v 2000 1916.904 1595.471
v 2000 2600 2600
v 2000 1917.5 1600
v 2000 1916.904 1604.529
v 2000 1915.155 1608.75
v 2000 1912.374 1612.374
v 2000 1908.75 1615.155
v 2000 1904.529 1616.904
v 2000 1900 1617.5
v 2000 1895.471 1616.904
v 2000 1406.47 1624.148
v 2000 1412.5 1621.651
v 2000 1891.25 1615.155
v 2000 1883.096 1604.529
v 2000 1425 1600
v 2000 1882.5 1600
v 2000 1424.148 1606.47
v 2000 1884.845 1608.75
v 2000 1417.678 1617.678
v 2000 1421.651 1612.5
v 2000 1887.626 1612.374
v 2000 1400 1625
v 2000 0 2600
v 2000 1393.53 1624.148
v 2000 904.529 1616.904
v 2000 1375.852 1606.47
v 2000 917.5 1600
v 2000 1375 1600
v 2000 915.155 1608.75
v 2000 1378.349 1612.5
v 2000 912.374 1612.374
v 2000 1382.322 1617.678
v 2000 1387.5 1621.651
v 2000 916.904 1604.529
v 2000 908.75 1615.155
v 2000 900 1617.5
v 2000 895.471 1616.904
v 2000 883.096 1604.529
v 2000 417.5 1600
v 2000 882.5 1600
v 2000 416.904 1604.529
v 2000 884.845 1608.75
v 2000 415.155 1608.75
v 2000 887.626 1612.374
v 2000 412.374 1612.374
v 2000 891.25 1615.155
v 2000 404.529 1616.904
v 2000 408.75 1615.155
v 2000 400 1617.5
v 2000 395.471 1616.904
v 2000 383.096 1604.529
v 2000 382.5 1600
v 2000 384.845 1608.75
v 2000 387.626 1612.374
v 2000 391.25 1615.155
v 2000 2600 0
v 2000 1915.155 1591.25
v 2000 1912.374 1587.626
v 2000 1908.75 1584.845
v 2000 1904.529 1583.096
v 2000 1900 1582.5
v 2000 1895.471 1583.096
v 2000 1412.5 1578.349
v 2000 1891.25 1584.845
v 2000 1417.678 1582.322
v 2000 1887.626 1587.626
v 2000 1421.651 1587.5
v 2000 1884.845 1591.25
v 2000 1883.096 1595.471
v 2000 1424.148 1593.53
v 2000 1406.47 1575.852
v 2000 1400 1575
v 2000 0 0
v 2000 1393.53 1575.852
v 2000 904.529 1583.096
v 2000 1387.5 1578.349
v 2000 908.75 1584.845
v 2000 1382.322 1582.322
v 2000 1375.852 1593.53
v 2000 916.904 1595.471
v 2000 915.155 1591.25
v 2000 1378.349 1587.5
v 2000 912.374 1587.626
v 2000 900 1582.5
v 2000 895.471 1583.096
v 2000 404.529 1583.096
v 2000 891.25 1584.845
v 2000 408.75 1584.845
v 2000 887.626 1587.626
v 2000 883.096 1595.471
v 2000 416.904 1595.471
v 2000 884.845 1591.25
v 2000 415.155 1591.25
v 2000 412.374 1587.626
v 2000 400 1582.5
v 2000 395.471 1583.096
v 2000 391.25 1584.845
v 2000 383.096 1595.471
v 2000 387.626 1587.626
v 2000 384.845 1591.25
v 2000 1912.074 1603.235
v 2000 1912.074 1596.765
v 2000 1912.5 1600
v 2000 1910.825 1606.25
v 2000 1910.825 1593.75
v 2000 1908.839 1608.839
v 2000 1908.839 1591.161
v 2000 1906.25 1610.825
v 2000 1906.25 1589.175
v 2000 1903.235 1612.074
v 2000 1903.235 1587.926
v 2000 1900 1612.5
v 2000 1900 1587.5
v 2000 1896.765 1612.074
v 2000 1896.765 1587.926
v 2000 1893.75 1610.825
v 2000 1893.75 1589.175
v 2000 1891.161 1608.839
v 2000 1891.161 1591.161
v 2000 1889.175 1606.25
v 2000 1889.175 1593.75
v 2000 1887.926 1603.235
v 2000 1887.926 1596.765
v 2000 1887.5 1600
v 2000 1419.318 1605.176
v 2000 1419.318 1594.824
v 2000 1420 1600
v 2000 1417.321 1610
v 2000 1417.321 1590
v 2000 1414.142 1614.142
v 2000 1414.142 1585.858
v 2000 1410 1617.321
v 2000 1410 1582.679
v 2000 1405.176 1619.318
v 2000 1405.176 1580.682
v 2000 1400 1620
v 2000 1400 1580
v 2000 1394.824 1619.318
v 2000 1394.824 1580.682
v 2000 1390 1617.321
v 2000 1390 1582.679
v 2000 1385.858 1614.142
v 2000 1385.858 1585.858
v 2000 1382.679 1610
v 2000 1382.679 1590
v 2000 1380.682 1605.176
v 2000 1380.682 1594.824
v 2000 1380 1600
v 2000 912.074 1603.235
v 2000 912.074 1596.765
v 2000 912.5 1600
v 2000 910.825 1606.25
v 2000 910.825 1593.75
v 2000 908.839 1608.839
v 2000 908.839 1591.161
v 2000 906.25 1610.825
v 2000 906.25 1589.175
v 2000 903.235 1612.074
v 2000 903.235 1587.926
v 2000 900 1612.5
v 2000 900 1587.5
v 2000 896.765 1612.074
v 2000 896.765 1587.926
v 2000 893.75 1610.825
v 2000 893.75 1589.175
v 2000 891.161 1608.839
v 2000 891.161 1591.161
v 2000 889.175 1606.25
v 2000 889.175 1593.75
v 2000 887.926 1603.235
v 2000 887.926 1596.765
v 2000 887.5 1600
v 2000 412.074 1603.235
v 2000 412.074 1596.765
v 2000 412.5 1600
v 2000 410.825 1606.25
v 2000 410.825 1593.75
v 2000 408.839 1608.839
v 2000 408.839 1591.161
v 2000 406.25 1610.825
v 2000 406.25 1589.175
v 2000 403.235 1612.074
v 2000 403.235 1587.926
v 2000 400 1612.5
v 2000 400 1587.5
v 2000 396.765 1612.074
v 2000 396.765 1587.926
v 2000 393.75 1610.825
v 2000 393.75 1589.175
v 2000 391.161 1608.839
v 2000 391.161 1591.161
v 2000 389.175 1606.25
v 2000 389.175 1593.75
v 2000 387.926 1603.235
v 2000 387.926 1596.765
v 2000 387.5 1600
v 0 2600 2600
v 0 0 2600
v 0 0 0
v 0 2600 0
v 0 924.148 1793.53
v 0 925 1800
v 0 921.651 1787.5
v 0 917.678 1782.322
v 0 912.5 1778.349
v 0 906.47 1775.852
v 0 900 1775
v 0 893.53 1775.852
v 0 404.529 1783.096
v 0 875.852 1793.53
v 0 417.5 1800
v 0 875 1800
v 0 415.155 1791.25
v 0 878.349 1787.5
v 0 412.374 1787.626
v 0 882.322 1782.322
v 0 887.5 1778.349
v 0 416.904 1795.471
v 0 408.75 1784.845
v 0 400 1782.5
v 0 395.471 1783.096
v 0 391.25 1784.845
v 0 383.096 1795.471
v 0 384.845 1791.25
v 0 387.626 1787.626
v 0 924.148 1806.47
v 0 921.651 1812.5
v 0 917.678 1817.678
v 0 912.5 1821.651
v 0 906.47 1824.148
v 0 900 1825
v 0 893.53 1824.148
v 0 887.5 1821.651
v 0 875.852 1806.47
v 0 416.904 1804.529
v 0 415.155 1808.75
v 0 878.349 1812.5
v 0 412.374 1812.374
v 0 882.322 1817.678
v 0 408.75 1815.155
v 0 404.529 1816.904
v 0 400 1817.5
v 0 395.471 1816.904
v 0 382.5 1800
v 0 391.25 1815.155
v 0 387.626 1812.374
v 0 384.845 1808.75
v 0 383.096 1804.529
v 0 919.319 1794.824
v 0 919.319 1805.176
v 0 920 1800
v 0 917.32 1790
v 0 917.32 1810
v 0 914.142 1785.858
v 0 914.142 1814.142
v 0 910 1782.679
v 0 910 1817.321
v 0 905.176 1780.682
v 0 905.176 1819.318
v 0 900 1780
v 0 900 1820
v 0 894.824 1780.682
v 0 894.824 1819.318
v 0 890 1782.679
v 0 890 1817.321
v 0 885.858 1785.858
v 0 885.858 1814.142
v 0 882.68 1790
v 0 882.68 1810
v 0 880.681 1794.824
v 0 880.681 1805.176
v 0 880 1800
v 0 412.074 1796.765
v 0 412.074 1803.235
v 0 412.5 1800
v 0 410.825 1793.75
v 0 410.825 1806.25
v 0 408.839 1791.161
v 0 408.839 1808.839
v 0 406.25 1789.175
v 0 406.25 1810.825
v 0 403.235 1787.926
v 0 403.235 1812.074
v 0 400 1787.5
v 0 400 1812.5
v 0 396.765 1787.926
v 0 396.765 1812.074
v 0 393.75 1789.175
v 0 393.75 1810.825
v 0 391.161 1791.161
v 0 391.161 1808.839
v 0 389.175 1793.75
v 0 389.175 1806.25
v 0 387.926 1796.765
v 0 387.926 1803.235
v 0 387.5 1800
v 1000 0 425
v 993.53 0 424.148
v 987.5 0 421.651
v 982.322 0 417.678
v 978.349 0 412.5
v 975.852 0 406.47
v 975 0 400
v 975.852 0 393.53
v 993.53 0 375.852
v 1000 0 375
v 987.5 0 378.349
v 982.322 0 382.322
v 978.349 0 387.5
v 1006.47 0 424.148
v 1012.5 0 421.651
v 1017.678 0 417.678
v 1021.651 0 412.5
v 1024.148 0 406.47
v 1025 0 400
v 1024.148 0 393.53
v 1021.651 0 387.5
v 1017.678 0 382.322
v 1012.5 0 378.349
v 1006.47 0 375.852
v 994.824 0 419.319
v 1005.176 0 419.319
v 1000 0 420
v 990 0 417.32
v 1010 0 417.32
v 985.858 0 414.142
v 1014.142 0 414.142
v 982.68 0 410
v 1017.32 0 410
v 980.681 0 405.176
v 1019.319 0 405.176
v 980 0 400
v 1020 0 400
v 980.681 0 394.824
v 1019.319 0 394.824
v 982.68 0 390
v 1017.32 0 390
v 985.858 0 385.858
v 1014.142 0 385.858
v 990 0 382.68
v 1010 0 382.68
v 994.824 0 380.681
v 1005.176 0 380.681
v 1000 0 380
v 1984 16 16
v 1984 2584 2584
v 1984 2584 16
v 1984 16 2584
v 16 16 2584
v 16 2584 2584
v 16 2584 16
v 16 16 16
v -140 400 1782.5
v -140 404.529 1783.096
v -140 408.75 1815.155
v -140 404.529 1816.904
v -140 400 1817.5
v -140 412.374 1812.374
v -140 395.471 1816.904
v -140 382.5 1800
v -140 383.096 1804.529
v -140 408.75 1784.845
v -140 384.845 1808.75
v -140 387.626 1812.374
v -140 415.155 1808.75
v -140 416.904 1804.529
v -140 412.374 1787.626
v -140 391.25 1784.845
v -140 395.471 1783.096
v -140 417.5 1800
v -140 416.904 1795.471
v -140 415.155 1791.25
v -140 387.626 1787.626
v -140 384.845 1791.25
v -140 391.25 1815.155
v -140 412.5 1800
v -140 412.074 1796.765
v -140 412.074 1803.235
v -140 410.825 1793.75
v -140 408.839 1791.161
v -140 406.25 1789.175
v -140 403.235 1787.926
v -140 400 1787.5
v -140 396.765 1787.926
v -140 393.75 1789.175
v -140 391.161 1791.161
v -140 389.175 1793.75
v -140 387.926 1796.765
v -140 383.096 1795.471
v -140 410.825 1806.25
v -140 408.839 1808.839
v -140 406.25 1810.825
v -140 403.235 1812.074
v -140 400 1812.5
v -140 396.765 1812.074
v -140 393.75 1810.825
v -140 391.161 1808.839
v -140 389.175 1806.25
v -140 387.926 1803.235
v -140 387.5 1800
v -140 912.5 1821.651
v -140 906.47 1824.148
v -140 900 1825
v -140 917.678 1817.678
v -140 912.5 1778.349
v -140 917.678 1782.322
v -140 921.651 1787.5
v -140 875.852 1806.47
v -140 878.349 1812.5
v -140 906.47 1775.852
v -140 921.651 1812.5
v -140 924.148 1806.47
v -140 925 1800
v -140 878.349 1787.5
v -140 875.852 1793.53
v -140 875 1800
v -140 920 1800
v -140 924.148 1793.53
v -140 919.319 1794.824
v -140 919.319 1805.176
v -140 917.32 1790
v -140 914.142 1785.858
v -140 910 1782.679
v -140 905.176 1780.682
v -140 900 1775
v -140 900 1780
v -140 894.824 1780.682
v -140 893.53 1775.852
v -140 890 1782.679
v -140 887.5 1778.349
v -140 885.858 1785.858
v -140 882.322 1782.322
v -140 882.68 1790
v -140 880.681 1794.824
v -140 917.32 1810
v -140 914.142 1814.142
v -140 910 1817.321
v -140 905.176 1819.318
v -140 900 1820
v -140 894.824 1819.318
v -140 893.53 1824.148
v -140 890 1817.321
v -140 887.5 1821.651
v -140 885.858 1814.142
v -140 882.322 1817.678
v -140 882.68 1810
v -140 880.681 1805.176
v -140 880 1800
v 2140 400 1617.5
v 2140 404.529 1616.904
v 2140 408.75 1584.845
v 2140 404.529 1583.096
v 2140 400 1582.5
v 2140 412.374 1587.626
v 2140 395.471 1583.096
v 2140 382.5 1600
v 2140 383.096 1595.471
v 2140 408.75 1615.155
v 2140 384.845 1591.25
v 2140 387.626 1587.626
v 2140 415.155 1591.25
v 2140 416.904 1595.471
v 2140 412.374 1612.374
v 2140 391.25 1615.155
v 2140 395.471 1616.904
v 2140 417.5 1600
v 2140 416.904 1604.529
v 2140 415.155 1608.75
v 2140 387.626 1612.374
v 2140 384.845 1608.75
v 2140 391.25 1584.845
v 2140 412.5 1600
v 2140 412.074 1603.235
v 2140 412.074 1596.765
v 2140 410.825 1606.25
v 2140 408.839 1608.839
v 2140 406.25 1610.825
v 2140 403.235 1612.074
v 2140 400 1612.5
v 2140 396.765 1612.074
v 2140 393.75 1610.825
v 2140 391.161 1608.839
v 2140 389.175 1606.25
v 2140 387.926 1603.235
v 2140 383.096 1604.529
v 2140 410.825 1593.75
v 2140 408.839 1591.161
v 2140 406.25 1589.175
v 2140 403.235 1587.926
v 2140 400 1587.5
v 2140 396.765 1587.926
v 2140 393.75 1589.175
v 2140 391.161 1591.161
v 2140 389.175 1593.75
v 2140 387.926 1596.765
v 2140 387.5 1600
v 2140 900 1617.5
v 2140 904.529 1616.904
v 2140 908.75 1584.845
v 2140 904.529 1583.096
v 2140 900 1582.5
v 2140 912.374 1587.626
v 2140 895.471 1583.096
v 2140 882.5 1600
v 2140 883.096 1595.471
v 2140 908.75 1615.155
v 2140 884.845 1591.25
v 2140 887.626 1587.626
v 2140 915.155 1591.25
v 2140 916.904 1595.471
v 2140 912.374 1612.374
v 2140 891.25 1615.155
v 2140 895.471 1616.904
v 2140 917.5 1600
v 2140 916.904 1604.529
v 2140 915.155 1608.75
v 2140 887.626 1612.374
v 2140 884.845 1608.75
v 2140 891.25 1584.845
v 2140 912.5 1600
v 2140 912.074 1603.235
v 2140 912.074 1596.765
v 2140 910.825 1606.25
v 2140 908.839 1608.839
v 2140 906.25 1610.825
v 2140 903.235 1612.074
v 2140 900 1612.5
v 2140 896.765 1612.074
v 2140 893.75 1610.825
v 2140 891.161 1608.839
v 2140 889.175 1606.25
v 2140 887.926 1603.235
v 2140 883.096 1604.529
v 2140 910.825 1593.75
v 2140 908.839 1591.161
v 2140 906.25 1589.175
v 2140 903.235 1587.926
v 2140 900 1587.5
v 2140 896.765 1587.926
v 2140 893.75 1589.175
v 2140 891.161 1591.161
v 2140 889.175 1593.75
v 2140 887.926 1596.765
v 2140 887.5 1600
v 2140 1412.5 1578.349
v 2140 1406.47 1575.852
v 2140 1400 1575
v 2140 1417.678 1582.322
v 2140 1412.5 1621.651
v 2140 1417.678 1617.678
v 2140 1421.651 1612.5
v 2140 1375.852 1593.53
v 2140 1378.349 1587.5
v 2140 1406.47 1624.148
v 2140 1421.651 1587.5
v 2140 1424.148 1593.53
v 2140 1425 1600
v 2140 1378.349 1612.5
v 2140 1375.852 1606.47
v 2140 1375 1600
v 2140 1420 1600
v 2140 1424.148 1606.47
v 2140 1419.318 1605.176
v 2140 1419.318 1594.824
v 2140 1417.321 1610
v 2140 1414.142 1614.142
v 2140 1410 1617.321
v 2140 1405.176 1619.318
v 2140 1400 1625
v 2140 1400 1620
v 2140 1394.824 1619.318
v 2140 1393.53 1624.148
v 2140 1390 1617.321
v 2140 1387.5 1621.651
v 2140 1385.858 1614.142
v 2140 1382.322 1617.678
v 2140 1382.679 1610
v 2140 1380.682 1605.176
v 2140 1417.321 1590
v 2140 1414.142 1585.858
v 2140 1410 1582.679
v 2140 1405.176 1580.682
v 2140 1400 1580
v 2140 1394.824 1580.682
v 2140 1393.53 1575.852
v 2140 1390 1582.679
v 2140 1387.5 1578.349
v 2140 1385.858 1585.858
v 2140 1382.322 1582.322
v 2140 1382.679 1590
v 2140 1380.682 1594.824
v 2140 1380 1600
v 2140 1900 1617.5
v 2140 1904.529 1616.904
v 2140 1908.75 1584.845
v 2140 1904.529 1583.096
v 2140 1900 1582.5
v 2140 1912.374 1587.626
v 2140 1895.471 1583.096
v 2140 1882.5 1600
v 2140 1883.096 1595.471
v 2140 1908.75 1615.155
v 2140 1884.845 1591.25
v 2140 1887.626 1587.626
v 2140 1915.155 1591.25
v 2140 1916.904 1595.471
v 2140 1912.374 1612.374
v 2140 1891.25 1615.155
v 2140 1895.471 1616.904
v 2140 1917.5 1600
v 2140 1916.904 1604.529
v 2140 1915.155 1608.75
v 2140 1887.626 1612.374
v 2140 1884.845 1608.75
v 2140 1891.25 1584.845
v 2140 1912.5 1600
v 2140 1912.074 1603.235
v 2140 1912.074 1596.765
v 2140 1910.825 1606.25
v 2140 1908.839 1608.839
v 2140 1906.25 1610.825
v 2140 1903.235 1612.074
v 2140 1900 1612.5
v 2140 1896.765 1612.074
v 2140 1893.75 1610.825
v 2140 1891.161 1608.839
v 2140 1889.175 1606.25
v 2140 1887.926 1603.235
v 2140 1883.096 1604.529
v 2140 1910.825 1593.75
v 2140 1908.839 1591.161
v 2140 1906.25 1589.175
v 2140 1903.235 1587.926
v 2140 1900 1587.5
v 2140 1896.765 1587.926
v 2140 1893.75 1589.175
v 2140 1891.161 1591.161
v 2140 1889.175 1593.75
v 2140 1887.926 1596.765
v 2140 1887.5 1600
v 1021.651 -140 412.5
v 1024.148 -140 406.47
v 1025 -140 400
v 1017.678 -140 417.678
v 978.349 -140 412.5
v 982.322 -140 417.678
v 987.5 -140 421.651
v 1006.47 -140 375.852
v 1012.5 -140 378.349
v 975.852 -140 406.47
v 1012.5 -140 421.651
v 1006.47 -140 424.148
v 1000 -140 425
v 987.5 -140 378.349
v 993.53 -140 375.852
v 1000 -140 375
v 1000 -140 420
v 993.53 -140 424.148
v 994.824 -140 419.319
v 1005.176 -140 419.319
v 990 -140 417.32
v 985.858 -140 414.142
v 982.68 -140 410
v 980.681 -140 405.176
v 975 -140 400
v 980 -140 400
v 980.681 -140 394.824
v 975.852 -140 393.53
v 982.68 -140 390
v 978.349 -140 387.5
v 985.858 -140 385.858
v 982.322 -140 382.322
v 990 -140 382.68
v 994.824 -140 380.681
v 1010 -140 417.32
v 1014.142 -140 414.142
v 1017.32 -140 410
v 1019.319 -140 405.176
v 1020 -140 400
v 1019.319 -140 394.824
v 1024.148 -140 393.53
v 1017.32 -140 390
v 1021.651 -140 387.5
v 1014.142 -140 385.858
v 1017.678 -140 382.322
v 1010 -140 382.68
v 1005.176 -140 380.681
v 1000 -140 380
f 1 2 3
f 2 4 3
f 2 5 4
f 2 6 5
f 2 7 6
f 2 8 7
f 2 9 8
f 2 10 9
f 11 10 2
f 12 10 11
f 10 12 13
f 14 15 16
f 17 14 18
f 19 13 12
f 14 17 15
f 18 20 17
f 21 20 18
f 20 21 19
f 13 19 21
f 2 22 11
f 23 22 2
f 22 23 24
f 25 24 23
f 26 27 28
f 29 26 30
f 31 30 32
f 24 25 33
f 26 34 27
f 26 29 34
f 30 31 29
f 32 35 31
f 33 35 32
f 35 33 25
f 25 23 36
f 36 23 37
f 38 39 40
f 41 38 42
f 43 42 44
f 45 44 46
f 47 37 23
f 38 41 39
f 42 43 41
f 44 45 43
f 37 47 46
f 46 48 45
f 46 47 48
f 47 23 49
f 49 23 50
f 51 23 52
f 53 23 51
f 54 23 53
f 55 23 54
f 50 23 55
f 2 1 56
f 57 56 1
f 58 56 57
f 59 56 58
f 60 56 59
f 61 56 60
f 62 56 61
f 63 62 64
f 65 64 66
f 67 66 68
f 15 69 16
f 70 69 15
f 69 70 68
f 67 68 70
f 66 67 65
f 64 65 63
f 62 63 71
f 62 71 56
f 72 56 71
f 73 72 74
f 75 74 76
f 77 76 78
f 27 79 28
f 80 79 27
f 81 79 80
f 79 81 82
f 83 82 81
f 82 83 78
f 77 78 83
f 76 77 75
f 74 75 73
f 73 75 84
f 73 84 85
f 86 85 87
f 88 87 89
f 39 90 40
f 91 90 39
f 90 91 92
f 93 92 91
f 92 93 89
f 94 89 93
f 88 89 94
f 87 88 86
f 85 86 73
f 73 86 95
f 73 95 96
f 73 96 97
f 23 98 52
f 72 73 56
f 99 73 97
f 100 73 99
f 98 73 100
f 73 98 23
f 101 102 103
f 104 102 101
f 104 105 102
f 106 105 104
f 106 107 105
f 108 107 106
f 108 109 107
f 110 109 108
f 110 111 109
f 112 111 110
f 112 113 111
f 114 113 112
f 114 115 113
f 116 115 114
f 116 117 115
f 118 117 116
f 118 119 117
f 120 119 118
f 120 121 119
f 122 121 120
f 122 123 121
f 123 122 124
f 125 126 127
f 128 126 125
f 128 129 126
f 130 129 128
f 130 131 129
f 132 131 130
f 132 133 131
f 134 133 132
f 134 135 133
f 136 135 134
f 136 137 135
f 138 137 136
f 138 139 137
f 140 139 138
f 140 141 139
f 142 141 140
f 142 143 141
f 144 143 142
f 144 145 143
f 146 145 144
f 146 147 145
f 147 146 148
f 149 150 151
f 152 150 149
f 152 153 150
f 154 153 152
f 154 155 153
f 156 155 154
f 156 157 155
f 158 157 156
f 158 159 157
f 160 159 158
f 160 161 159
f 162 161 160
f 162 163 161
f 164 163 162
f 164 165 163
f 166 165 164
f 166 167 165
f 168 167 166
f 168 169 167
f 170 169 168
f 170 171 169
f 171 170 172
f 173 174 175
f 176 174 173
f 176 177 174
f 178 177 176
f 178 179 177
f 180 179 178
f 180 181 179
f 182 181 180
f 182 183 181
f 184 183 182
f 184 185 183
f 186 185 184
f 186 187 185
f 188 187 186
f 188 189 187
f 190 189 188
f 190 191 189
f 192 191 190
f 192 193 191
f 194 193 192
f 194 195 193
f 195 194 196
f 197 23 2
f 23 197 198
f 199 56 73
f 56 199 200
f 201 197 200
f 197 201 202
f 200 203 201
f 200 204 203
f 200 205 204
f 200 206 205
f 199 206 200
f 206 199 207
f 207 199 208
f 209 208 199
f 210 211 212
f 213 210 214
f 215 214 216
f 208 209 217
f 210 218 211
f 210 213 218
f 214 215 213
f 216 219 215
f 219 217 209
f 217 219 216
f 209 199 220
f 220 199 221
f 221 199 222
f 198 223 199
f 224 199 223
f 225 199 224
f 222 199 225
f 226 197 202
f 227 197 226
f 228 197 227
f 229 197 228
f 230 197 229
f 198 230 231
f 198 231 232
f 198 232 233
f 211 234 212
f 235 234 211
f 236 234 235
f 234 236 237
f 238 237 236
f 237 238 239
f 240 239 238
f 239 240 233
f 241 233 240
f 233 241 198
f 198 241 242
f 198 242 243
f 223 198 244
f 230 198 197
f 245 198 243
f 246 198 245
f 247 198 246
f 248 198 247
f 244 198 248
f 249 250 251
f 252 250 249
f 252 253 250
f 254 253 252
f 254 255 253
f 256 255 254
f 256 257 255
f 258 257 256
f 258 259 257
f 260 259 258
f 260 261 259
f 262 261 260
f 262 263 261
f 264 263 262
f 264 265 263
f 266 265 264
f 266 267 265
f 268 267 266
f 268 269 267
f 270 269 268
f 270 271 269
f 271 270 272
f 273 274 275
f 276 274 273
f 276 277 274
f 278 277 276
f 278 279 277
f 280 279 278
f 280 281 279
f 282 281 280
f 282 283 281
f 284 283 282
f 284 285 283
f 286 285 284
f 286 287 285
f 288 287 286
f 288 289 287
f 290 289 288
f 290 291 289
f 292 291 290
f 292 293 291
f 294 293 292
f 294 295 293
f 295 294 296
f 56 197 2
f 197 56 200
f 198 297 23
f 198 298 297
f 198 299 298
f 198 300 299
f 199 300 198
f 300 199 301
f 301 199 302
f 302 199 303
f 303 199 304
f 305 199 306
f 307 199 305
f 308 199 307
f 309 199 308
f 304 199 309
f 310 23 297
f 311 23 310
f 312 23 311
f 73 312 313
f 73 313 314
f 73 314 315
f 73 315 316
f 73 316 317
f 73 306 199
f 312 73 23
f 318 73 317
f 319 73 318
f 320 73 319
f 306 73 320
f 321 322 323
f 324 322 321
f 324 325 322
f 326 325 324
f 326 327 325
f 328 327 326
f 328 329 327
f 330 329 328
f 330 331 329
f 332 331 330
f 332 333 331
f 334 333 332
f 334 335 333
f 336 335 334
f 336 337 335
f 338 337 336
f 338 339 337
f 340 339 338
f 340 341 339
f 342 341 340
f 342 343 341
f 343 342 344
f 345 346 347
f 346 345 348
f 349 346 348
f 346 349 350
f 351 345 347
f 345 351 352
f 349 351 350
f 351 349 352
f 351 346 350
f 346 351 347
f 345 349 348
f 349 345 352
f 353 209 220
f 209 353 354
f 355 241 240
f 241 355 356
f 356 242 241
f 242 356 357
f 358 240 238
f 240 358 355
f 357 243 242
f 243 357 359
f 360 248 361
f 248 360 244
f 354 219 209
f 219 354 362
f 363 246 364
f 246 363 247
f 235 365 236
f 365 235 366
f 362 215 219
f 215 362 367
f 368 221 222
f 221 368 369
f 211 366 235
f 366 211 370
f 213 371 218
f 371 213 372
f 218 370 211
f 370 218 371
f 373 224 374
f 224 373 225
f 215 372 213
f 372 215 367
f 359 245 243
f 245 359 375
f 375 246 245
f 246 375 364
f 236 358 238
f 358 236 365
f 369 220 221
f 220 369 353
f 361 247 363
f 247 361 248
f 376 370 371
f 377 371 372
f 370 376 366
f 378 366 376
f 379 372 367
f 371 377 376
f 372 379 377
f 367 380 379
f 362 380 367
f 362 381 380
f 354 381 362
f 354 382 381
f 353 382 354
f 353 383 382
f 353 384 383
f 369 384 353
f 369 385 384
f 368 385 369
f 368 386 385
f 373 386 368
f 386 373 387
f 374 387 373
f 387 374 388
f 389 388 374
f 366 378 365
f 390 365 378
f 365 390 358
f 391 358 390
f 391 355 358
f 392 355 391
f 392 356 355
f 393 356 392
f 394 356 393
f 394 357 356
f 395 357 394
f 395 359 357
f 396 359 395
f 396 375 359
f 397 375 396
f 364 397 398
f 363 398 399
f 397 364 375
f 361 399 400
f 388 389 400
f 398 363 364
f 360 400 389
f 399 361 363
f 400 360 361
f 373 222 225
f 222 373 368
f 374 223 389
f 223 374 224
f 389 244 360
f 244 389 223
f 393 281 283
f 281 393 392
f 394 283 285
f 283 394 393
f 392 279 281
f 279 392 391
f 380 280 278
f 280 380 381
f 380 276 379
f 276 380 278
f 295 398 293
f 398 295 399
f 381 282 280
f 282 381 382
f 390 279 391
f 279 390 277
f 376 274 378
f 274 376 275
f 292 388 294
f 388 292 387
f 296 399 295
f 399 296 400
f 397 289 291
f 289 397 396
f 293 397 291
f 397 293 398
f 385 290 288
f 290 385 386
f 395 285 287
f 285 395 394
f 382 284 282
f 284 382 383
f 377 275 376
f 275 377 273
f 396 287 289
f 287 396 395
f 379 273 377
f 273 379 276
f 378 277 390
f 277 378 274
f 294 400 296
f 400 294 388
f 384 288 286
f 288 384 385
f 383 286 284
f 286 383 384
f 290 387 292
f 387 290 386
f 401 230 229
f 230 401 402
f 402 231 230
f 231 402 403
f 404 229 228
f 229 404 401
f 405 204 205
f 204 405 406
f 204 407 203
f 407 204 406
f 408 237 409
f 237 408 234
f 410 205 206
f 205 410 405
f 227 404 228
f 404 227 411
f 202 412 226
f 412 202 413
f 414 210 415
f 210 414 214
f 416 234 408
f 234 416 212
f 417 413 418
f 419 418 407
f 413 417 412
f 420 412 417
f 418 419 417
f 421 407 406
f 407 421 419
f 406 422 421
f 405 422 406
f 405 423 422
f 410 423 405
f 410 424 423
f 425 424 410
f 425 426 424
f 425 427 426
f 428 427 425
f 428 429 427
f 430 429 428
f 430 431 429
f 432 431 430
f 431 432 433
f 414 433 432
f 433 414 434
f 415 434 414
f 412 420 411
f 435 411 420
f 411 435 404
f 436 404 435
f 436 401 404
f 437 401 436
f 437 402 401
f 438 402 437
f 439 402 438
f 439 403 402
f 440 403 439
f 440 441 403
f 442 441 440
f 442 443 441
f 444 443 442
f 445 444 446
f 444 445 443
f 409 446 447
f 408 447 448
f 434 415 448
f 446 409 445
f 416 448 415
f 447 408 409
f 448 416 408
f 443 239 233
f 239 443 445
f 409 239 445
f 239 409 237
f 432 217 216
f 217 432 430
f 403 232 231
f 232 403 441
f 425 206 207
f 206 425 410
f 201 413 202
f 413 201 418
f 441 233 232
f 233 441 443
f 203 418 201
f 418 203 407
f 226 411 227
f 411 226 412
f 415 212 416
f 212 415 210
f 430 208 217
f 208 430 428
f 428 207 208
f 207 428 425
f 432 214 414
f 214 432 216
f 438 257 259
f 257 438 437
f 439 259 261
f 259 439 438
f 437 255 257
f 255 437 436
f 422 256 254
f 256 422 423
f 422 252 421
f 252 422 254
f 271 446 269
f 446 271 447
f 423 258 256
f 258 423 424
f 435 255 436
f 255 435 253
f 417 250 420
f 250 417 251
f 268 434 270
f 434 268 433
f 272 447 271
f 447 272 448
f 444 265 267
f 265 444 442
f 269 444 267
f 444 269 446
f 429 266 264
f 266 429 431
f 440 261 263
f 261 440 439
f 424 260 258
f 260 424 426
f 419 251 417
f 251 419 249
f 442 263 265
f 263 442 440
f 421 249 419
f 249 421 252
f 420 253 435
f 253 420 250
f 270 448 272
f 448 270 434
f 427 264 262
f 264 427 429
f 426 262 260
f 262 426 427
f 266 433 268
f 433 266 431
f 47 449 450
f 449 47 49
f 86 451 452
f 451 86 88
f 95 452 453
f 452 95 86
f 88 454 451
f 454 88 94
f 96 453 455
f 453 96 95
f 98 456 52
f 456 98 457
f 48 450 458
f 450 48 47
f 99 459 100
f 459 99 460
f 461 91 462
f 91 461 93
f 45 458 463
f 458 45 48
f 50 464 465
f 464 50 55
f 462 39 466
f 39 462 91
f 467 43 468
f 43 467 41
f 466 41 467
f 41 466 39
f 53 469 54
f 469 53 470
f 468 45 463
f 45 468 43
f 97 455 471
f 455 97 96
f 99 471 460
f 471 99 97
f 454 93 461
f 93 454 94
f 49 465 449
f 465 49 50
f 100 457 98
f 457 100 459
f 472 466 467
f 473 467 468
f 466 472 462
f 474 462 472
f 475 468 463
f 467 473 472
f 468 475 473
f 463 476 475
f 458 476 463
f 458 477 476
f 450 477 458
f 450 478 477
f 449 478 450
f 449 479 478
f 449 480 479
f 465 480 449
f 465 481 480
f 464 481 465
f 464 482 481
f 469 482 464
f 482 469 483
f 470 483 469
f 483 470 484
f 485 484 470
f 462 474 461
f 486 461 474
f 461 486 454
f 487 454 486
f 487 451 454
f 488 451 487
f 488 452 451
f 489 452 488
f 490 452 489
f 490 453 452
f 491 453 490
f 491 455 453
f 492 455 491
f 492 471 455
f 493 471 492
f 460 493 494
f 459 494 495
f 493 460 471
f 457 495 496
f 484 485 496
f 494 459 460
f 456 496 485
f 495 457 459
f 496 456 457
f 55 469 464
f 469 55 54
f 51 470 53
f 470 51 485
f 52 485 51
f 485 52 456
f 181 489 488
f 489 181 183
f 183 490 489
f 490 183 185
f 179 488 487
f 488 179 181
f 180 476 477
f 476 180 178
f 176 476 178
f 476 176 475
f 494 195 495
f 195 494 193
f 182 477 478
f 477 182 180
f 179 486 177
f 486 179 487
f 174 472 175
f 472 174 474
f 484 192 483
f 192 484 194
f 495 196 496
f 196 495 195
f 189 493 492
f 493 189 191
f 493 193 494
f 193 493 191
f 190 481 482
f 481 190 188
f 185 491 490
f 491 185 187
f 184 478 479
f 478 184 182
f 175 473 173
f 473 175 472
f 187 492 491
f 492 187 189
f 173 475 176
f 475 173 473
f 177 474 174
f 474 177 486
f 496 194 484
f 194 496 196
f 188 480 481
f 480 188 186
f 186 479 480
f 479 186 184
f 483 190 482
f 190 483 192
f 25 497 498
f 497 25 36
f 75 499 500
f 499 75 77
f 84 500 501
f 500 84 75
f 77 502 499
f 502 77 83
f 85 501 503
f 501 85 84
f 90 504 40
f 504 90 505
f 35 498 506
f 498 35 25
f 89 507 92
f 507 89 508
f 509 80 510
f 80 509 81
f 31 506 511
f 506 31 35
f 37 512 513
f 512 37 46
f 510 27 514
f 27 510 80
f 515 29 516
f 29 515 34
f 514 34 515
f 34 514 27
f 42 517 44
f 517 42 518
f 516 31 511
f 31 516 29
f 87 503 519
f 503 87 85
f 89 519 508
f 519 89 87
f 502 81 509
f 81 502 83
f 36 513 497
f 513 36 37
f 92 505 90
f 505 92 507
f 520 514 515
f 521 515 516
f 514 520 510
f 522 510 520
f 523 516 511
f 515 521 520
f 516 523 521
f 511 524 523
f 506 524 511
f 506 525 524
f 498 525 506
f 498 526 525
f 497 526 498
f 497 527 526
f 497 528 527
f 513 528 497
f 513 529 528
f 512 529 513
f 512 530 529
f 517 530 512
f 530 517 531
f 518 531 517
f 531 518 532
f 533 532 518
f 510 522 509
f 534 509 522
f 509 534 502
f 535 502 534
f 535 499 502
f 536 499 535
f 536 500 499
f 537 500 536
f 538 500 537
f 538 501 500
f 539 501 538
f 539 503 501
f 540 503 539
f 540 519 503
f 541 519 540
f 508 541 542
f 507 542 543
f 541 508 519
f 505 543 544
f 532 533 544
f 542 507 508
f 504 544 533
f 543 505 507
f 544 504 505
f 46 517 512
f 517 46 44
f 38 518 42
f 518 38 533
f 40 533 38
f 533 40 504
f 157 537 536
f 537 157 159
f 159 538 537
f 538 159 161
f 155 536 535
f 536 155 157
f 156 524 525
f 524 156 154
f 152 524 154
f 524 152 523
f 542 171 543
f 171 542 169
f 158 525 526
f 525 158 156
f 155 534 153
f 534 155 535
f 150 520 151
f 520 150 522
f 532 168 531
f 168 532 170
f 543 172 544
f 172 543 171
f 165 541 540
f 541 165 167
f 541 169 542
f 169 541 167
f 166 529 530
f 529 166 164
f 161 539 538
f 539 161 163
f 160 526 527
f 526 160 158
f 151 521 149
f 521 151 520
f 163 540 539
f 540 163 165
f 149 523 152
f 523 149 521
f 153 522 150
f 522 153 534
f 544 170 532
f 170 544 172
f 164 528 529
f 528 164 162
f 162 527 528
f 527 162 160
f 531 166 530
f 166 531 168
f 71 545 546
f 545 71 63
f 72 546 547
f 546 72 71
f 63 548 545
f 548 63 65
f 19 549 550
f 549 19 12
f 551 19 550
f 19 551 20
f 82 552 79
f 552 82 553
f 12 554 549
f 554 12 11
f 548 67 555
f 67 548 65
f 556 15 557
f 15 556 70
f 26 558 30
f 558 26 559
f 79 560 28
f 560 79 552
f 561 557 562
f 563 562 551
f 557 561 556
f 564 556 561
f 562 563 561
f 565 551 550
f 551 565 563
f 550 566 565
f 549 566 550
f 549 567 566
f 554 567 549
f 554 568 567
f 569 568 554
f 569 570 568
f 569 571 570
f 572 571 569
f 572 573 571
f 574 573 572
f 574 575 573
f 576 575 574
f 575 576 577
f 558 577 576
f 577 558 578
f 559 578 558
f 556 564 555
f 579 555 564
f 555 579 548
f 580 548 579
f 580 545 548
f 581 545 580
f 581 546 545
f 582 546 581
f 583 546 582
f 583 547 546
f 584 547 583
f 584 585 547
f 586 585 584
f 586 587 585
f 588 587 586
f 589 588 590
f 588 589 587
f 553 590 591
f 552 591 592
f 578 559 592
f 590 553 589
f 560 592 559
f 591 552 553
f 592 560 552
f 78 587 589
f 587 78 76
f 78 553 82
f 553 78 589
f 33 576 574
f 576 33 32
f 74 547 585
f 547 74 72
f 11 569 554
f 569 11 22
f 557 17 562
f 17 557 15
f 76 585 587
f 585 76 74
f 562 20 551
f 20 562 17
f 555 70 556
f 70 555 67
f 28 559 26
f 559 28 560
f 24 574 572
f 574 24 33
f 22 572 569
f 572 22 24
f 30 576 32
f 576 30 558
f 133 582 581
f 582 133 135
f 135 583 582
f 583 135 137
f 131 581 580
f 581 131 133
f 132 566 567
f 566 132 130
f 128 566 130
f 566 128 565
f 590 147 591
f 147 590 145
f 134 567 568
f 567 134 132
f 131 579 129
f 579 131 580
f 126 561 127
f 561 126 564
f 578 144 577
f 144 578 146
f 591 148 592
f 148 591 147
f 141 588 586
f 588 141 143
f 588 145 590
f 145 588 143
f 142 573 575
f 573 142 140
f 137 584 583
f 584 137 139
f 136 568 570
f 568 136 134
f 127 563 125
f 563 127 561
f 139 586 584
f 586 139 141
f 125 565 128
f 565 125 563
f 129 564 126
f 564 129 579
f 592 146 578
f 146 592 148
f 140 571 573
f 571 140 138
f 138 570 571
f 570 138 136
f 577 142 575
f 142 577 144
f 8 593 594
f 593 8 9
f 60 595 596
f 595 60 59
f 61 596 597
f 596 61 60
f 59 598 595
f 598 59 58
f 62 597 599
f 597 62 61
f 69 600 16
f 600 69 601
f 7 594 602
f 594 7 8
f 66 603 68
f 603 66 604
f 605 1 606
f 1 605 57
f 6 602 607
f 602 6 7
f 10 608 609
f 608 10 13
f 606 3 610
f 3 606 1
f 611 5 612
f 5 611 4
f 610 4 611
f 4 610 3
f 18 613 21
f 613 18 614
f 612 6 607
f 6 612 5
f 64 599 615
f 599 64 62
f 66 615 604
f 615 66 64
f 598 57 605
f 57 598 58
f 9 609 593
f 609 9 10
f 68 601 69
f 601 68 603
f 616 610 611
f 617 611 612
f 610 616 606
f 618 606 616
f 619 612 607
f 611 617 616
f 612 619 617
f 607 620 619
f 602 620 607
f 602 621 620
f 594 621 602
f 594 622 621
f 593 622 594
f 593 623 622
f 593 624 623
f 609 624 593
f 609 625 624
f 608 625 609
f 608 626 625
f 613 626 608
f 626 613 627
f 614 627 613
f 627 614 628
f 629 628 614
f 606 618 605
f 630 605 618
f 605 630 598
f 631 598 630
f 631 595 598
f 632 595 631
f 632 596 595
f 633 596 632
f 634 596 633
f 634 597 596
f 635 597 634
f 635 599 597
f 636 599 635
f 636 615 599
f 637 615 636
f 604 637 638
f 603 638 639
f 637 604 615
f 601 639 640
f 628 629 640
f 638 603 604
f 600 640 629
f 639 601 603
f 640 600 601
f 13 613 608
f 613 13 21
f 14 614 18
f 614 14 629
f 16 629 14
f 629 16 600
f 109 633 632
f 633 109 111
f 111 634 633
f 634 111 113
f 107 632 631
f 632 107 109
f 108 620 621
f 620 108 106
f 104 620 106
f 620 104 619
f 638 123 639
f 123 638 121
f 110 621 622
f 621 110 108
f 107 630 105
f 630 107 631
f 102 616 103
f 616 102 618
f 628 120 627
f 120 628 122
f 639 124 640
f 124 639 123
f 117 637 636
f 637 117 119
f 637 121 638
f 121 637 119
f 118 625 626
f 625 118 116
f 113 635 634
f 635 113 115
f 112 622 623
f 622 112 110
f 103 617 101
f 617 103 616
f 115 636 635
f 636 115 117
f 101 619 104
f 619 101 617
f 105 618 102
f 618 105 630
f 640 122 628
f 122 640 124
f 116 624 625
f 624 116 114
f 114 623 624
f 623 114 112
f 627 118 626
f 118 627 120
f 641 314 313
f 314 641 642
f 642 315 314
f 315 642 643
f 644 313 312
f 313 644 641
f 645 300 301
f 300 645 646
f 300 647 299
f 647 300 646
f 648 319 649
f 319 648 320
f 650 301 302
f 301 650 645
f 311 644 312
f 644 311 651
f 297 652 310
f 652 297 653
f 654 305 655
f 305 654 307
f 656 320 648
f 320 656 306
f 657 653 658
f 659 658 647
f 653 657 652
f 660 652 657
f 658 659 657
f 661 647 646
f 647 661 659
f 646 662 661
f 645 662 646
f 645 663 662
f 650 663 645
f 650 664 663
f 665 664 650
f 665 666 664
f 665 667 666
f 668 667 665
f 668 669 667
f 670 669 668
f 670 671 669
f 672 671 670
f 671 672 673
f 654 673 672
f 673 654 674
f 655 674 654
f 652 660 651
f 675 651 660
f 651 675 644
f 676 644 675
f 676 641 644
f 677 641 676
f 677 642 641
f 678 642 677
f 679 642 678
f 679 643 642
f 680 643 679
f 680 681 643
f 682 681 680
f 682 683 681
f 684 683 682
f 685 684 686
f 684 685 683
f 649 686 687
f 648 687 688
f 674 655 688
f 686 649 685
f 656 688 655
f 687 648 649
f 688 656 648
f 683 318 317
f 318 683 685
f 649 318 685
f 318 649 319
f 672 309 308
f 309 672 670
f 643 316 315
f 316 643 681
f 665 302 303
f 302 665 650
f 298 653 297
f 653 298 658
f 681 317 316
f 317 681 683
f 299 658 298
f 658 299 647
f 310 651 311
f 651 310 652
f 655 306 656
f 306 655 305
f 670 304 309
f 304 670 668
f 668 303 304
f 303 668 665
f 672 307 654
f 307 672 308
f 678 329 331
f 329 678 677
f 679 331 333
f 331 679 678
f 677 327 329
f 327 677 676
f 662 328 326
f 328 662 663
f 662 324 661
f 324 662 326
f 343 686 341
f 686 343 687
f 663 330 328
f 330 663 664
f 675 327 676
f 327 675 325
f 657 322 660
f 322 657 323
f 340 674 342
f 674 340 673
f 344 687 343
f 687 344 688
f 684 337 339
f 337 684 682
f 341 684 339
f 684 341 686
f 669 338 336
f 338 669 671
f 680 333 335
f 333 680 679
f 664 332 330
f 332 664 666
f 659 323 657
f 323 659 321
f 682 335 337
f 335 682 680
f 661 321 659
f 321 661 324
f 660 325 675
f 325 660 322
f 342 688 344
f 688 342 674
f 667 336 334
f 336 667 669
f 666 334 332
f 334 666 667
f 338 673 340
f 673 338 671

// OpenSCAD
// file: ../params.scad
// Shared millimetre parameters. Keep in lockstep with freecad/params.py.
// Module scale: 150 kg/day wet train. Walls are CPVC sheet, not metal.

$fn = 36;

WALL        = 12;     // CPVC sheet thickness
FLOOR       = 16;     // floor plate (trough sits on this)

// LEACH CSTR 1 — inside liquor box
CSTR_L      = 2000;
CSTR_W      = 1200;
CSTR_H      = 1400;   // liquid + freeboard
FREEBOARD   = 200;

// CSTR 2 weir (same vessel, +X wall)
WEIR_W      = 450;
WEIR_CREST  = CSTR_H - FREEBOARD;   // from inner floor
WEIR_SLOT_H = 80;
WEIR_LIP    = 120;    // external spout projection

// CSTR 3 floor auger — injection-molded PVC / FG
AUGER_D     = 140;    // flight OD
AUGER_SHAFT = 40;
AUGER_PITCH = 110;
AUGER_TROUGH_W = 180;
AUGER_TROUGH_H = 110;
AUGER_OFFSET_Y = 280; // trough centreline from inner -Y wall
AUGER_INCLINE  = 28;  // deg, lifts out of liquor toward +X

// mixer / nozzles (lid)
MIXER_D     = 50;
GAS_D       = 80;     // acid-gas takeoff
DROP_X      = 80;     // inner-X of shred drop slot
DROP_L      = 400;
DROP_W      = 250;
DROP_COAM   = 80;     // raised coaming around the slot

// LEACHATE PUMP / coarse strainer — −X wall, opposite the weir
PUMP_D      = 80;     // DN80
PUMP_Z      = 450;    // centreline above inner floor (submerged)
PUMP_Y      = 900;    // centreline from inner −Y (away from auger)
STRAINER_L  = 180;
STRAINER_W  = 140;
STRAINER_H  = 160;

// mezzanine feed train
MEZZ_H      = 2200;   // platform top above tank outer floor
MEZZ_L      = 1600;   // platform length in −X
MEZZ_THK    = 12;
HOPPER_L    = 700;
HOPPER_W    = 600;
HOPPER_H    = 800;
SHRED_L     = 500;
SHRED_W     = 500;
SHRED_H     = 450;
CONV_W      = 240;
CONV_H      = 120;
CONV_PLATE  = 6;      // trough plate
CONV_FLANGE = 40;
CONV_SPRING_D = 50;
CONV_SPRING_H = 80;
CONV_BOLT   = 10;     // M10 clearance
CONV_LEN    = 1800;   // default standalone length; plant instance is computed
DUST_D      = 150;    // dust-hood outlet to DUST header
AUGER_LIFT_L = 700;

// dewater belts + split (Phase A 4–6)
FDEW_L      = 1800;
FDEW_W      = 450;
FDEW_H      = 80;
FDEW_RISE   = 120;    // solids end higher so liquor runs back to weir
SDEW_L      = 1400;
SDEW_W      = 220;
SDEW_H      = 80;
SPLIT_L     = 600;
SPLIT_W     = 500;
SPLIT_H     = 400;
STUB_L      = 400;
STUB_W      = 300;
STUB_H      = 250;

// EW funnel cell
EW_L        = 600;    // along aisle (overflow direction)
EW_W        = 420;    // anode-cathode depth
EW_H        = 650;    // rectangular body
EW_FUNNEL_H = 220;
EW_VALVE_D  = 50;
EW_VALVE_L  = 60;
EW_MEM_T    = 4;      // CEM
EW_SLOT     = 10;     // membrane cassette slot
EW_PITCH    = 750;    // aisle spacing, centre to centre
AISLE_X0    = 200;
AISLE_Y     = -(EW_W + 2*WALL) - 400;
AISLE_Z     = 400;
BUND_H      = 150;
BUND_PAD    = 250;
SUMP_L      = 400;
SUMP_W      = 400;
SUMP_H      = 300;
VDF_D       = 700;
VDF_L       = 900;
PAIL_W      = 180;
HDR_D       = 80;
HDR_Z       = 1400;
PYRO_D      = 320;
PYRO_L      = 2800;

// Campus envelopes — lockstep with freecad/params.py
FARM_X=12000; FARM_Y=8000; FARM_L=12000; FARM_W=8000; FARM_H=4500;
FAB_X=12000;  FAB_Y=-6000; FAB_L=8000;   FAB_W=6000;  FAB_H=4000;
HAB_X=-8000;  HAB_Y=8000;  HAB_L=8000;   HAB_W=6000;  HAB_H=3200;
CRYO_X=-6000; CRYO_Y=-4000; CRYO_L=4000; CRYO_W=3000; CRYO_H=3000;
MFG_X=2000;   MFG_Y=9000;  MFG_L=6000;   MFG_W=4000;  MFG_H=3500;

LIFE_Z_GREY=900; LIFE_Z_UPW=1100; LIFE_Z_ETCH=1300;
LIFE_Z_O2=2800; LIFE_Z_N2=3000; LIFE_Z_CO2=3200;
LIFE_D_GREY=50; LIFE_D_UPW=40; LIFE_D_ETCH=32;
LIFE_D_GAS=25; LIFE_D_CO2=40;
// main file
// COLD BOX — vacuum shell + C1–C6. Not the ZnBr2 Br2 tower.
include <../params.scad>;
$fn = 24;
L=2000; W=2600; H=2600; T=16;

module stub(d, l=140) {
    difference() {
        cylinder(h=l, d=d+10);
        translate([0,0,-1]) cylinder(h=l+2, d=d);
    }
}

module mfg_cold_box() {
    difference() {
        cube([L, W, H]);
        translate([T, T, T]) cube([L-2*T, W-2*T, H-2*T]);
    }
    translate([0, 400, 1800]) rotate([0,-90,0]) stub(25); // C1 H2 in
    translate([0, 900, 1800]) rotate([0,-90,0]) stub(40); // C2 air
    translate([L, 400, 1600]) rotate([0,90,0]) stub(25);  // C3 O2
    translate([L, 900, 1600]) rotate([0,90,0]) stub(25);  // C4 N2
    translate([L, 1400, 1600]) rotate([0,90,0]) stub(40); // C5 CO2
    translate([L, 1900, 1600]) rotate([0,90,0]) stub(25); // C6 H2 out
    translate([L/2, 0, 400]) rotate([90,0,0]) stub(40);   // C7 Q reject
}

mfg_cold_box();
